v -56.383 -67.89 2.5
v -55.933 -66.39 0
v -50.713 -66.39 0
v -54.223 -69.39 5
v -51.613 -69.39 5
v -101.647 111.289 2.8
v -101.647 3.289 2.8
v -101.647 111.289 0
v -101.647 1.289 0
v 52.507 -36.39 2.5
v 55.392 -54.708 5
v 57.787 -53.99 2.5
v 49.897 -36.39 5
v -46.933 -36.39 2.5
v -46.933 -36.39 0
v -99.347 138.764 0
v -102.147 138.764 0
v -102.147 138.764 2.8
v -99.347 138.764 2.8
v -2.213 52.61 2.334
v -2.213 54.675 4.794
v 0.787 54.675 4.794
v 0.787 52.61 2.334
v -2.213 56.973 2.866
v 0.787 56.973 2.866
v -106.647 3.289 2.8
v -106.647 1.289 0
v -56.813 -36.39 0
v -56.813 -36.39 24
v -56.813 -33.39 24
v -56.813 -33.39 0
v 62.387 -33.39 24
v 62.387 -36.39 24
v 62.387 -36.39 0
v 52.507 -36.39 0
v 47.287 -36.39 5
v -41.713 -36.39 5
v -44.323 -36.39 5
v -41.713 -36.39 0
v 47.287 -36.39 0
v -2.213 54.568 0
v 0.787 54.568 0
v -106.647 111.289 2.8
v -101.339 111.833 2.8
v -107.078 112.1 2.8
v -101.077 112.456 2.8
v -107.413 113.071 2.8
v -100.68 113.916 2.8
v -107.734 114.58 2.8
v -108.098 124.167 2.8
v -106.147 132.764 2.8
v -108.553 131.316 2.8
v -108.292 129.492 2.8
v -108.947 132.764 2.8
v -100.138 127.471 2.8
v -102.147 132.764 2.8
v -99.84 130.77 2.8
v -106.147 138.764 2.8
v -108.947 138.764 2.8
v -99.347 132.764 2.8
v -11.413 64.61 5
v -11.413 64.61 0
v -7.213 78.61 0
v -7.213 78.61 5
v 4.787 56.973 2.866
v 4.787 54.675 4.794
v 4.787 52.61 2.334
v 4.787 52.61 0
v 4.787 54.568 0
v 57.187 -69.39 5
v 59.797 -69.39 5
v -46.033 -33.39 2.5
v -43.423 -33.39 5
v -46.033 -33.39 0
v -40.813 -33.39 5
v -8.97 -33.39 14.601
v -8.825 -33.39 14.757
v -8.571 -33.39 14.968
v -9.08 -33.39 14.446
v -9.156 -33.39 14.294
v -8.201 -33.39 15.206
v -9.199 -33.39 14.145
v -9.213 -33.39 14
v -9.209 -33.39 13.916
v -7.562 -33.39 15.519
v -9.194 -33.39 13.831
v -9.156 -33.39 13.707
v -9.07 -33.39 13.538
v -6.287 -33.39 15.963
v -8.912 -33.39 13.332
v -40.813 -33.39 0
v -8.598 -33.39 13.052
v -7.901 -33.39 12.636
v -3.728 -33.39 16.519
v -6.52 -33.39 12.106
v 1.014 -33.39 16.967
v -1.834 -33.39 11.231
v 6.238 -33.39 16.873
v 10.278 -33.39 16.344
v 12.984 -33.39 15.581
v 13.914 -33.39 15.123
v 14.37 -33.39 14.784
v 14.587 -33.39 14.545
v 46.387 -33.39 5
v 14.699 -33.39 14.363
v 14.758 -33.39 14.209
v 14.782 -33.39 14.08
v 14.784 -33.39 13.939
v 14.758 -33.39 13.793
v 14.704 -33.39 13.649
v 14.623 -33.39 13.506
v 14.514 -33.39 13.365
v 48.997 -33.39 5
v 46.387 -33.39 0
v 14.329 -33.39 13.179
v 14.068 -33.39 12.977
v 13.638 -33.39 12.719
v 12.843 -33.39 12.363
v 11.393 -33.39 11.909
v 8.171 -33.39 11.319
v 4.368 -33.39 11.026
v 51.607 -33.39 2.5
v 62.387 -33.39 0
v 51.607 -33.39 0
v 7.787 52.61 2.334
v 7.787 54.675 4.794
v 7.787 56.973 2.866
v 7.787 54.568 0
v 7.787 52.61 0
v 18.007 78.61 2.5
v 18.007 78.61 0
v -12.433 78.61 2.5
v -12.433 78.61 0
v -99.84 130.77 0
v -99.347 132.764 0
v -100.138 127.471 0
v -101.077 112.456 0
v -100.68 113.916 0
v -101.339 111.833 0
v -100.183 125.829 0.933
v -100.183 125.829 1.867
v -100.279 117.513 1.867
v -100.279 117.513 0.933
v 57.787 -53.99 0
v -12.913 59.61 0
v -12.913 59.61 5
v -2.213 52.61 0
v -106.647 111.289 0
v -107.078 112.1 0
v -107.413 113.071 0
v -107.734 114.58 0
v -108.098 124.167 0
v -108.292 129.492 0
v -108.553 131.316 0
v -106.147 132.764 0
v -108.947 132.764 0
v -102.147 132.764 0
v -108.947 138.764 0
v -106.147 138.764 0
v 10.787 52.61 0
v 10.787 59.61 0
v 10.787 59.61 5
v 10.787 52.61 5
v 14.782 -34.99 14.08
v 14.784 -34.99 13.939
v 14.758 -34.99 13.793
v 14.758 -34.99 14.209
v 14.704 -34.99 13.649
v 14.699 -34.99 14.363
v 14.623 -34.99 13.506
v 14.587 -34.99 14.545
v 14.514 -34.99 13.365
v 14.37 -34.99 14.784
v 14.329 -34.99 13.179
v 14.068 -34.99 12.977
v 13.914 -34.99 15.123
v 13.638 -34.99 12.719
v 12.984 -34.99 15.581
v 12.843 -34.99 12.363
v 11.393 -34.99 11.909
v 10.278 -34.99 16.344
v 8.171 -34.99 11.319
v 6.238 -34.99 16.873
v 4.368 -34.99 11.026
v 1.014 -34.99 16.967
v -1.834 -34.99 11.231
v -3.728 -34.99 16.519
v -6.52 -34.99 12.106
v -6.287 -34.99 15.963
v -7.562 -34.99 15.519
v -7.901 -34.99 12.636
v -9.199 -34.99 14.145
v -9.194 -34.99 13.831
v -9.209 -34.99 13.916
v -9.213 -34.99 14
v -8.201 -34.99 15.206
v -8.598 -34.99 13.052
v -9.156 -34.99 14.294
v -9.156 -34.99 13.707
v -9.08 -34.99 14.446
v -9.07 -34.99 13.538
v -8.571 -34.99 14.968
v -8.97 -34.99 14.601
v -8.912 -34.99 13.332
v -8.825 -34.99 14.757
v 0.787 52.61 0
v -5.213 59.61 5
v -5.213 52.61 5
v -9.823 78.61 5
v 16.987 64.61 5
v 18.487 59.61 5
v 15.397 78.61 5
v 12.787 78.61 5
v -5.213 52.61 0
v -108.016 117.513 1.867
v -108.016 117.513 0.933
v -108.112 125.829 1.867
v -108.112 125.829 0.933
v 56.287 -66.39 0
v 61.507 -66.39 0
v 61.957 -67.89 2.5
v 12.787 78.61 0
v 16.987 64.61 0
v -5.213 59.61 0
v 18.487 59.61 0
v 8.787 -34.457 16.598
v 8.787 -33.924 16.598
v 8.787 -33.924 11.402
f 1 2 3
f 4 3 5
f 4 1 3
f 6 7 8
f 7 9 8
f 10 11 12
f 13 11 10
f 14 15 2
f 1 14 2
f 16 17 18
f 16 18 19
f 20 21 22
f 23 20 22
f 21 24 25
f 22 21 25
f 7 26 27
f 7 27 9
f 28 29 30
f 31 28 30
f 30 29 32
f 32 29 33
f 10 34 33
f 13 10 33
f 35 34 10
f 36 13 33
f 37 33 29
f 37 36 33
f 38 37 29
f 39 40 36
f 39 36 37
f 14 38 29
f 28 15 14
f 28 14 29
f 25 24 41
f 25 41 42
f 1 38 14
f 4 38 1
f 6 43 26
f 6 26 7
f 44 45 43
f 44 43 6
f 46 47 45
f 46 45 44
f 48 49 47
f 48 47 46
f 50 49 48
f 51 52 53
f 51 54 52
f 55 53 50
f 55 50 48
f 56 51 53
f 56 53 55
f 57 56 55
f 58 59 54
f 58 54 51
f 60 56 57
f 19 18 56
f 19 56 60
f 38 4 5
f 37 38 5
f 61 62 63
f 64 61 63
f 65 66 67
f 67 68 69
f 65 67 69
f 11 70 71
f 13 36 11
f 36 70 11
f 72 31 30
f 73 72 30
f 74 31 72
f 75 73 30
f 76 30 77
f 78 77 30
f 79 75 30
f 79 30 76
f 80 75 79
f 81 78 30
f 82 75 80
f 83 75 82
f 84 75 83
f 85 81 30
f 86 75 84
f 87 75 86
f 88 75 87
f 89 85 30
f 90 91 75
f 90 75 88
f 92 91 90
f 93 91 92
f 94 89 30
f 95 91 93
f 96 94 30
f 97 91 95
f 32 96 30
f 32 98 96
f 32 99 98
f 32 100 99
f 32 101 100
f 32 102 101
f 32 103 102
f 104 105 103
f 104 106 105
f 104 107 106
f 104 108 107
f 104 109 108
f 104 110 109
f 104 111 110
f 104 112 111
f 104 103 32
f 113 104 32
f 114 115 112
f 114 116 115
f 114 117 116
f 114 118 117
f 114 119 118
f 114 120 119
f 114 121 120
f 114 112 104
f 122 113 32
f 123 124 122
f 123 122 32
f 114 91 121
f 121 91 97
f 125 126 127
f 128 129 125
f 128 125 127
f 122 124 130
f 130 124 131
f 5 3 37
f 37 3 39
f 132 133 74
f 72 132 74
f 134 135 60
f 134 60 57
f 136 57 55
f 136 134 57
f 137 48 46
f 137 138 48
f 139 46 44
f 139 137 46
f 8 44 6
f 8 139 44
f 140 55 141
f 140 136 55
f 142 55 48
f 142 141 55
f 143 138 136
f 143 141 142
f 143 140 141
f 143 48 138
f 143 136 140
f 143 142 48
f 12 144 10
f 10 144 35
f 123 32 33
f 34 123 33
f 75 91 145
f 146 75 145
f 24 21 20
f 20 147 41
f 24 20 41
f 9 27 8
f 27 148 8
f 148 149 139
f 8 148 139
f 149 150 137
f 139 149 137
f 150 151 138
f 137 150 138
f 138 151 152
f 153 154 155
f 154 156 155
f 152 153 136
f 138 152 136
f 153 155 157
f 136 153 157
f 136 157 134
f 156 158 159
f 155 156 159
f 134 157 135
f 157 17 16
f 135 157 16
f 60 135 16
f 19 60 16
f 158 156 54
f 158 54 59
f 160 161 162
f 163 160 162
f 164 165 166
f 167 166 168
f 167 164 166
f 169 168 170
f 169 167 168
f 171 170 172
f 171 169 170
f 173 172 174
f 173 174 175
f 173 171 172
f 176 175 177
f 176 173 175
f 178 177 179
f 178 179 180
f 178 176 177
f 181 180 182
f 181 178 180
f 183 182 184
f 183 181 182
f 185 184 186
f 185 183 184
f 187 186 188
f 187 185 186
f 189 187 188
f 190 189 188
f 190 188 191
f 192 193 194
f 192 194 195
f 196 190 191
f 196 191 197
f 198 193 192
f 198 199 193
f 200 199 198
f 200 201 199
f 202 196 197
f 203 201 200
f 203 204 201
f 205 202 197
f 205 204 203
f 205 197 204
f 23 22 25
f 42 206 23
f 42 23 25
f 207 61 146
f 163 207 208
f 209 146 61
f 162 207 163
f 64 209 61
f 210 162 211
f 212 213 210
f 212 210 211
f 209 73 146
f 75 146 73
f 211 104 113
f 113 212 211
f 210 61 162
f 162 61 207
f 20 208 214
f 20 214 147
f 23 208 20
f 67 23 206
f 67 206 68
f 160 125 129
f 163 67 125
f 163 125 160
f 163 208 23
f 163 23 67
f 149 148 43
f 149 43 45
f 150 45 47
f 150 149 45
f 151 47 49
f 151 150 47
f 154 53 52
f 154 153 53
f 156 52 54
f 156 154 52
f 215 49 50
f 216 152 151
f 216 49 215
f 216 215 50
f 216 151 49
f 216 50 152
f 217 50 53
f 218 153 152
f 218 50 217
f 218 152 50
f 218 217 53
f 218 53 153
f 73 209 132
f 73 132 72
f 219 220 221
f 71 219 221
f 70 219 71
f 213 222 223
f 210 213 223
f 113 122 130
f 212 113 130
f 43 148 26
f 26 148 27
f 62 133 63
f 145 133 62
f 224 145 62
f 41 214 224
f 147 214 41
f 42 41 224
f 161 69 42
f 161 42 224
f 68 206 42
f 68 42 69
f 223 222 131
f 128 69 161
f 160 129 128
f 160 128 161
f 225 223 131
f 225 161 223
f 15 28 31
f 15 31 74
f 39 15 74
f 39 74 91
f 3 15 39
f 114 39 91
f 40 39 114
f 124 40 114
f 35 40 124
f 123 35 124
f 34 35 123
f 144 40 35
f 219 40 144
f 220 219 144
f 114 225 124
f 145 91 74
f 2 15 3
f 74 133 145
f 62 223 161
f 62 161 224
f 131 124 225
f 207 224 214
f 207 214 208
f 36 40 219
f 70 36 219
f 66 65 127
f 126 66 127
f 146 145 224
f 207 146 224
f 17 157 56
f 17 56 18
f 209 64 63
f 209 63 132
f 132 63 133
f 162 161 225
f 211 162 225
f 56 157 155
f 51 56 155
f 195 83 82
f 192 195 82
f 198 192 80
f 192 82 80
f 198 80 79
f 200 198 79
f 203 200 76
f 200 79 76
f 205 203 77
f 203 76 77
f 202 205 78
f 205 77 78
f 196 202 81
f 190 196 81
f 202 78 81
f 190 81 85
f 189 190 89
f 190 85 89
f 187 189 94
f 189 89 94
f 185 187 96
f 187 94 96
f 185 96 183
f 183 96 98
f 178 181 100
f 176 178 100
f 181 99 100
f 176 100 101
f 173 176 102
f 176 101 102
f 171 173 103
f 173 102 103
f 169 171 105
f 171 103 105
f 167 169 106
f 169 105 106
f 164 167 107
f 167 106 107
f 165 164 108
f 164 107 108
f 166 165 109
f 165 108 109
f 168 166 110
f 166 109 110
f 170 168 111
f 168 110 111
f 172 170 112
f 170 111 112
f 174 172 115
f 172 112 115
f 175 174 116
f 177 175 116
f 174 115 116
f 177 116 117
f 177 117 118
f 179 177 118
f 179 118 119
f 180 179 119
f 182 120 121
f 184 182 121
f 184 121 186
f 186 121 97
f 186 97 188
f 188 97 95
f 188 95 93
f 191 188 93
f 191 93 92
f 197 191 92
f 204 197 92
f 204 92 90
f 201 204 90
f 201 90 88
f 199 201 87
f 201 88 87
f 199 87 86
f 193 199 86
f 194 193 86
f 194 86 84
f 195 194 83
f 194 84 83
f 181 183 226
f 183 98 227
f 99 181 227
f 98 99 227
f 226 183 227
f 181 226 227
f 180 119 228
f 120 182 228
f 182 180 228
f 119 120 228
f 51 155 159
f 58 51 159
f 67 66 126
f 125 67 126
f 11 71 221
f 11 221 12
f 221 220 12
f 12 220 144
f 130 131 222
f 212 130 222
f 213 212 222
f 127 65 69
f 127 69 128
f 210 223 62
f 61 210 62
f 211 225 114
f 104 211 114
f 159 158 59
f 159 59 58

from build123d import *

# Parameters (mm, degrees)
F1_DEPTH     = 5
F3_DEPTH     = 24
F4_W         = 16
F4_H         = 5
F5_DEPTH     = 7
F7_W         = 3
F7_H         = 3
F8_DEPTH     = 5
F9_W         = 2.8
F9_H         = 6
F10_DEPTH    = 2.8
F11_SIZE2    = 1.99999
F11_SIZE     = 2.79999
F13_W        = 140.8556848764
F13_H        = 22.6161023602
F14_DEPTH    = 2
F15_T1_DEPTH = 31.0827660092
F15_T3_DEPTH = 31.0827642559
F17_DEPTH    = 1.6
F18_SIZE     = 2.5


# Not quite as in the source:
# - a fillet or chamfer that OpenCascade refuses, or shapes differently, is made with other operations: its cross-section is extruded or revolved along the edge and cut away or added
# - a fillet or chamfer is up to 0.001 mm smaller than in the source, because OpenCascade refuses the exact size


with BuildPart() as f1:
    # F0 (on Top) → F1 (new body)
    with BuildSketch(Plane.XY):
        Polygon((-11.4133255483, 64.60974645), (-7.2133255483, 78.60974645), (-12.4334788322, 78.60974645), (-52.2133255483, -53.9897426034), (-52.2133255483, -71.39025355), (-41.7133255483, -36.39025355), (-40.8133255483, -33.39025355), (-12.9133255483, 59.60974645), align=None)
        Polygon((16.9866744517, 64.60974645), (-11.4133255483, 64.60974645), (-12.9133255483, 59.60974645), (18.4866744517, 59.60974645), align=None)
        Polygon((18.006829489, 78.60974645), (12.7866744517, 78.60974645), (16.9866744517, 64.60974645), (18.4866744517, 59.60974645), (46.3866744517, -33.39025355), (47.2866744517, -36.39025355), (57.7866744517, -71.39025355), (57.7866744517, -53.989736759), align=None)
        Polygon((46.3866744517, -33.39025355), (-40.8133255483, -33.39025355), (-41.7133255483, -36.39025355), (47.2866744517, -36.39025355), align=None)
        Polygon((-52.2133255483, -71.39025355), (-52.2133255483, -53.9897426034), (-57.0024570015, -69.953514114), align=None)
        Polygon((62.5758075135, -69.9535136315), (57.7866744517, -53.989736759), (57.7866744517, -71.39025355), align=None)
    extrude(amount=F1_DEPTH)

    # F2 (on face) → F3 (join)
    with BuildSketch(Plane(origin=(0, 0, 0), x_dir=(1, 0, 0), z_dir=(0, 0, -1))):
        Polygon((-56.8133255483, 33.39025355), (-40.8133255483, 33.39025355), (46.3866744517, 33.39025355), (62.3866744517, 33.39025355), (62.3866744517, 36.39025355), (47.2866744517, 36.39025355), (-41.7133255483, 36.39025355), (-56.8133255483, 36.39025355), align=None)
    extrude(amount=-F3_DEPTH)

    # F4 (on face) → F5 (join)
    with BuildSketch(Plane.XZ.offset(-59.60974645)):
        with Locations((2.7866744517, 2.5)):
            Rectangle(F4_W, F4_H)
    extrude(amount=F5_DEPTH)

    # F7 (on face) → F8 (cut)
    with BuildSketch(Plane(origin=(0, 21.7370799257, 25.905243094), x_dir=(1, 0, 0), z_dir=(0, 0.6427876097, 0.7660444431))):
        with Locations((6.2866744517, 40.3014039219)):
            Rectangle(F7_W, F7_H)
        with Locations((-0.7133255483, 40.3014039219)):
            Rectangle(F7_W, F7_H)
    extrude(amount=F8_DEPTH, mode=Mode.SUBTRACT)

    # F13 (on 3pt) → F14 (cut)
    with BuildSketch(Plane.XZ.offset(71.39025355)):
        with Locations((4.5045018196, 1.0812641121)):
            Rectangle(F13_W, F13_H)
    extrude(amount=-F14_DEPTH, mode=Mode.SUBTRACT)

    # F15: chamfer of 5 x 3 on 2 edges, made by hand

    # F15_s2 → F15_t1 (cut)
    with BuildSketch(Plane.YZ.offset(44.2553689658)):
        Polygon((-66.39025355, 0), (-69.39025355, 5), (-69.39025355, 0), align=None)
    extrude(amount=F15_T1_DEPTH, mode=Mode.SUBTRACT)

    # F15_s4 → F15_t3 (cut)
    with BuildSketch(Plane.YZ.offset(-69.7647843182)):
        Polygon((-66.39025355, 0), (-69.39025355, 5), (-69.39025355, 0), align=None)
    extrude(amount=F15_T3_DEPTH, mode=Mode.SUBTRACT)

    # F16 (on face) → F17 (cut)
    with BuildSketch(Plane(origin=(0, -33.39025355, 0), x_dir=(-1, 0, 0), z_dir=(0, 1, 0))):
        with BuildLine():
            add(Edge.make_bspline(
                [(9.2133255483, 14), (9.2133255483, 19.1961524227), (-8.7866744517, 16.5980762114), (-26.7866744517, 14), (-8.7866744517, 11.4019237886), (9.2133255483, 8.8038475773), (9.2133255483, 14)],
                knots=[0, 0, 0, 2.0943951024, 2.0943951024, 4.1887902048, 4.1887902048, 6.2831853072, 6.2831853072, 6.2831853072], degree=2, weights=[1, 0.5, 1, 0.5, 1, 0.5, 1]))
        make_face()
    extrude(amount=-F17_DEPTH, mode=Mode.SUBTRACT)

    # F18
    f18_edges = [f1.edges().sort_by_distance(p)[0] for p in [
        (-29.233479, 22.609746, 5),
        (34.806829, 22.609746, 5),
        (-51.883479, -52.890254, 5),
        (57.456829, -52.890254, 5),
    ]]
    chamfer(f18_edges, length=F18_SIZE)


with BuildPart() as f10:
    # F9 (on Top) → F10 (new body)
    with BuildSketch(Plane.XY):
        with BuildLine():
            Line((-106.6472975697, 1.2893290818), (-101.6472975697, 1.2893290818))
            Line((-101.6472975697, 1.2893290818), (-101.6472975697, 111.2893290818))
            add(Edge.make_bspline(
                [(-101.6472975697, 111.2893290818), (-102.9340378828, 109.355815566), (-105.3605572566, 109.355815566), (-106.6472975697, 111.2893290818)],
                knots=[0.403038575, 0.403038575, 0.403038575, 0.403038575, 0.596961425, 0.596961425, 0.596961425, 0.596961425], degree=3))
            Line((-106.6472975697, 111.2893290818), (-106.6472975697, 1.2893290818))
        make_face()
        with BuildLine():
            Line((-106.6472975697, 111.2893290818), (-101.6472975697, 111.2893290818))
            add(Edge.make_bspline(
                [(-99.3472975697, 132.7641010284), (-101.2220129553, 127.6781910253), (-98.973007346, 115.3078371211), (-101.6472975697, 111.2893290818)],
                knots=[0, 0, 0, 0, 0.403038575, 0.403038575, 0.403038575, 0.403038575], degree=3))
            Line((-99.3472975697, 132.7641010284), (-102.1472975697, 132.7641010284))
            Line((-102.1472975697, 132.7641010284), (-106.1472975697, 132.7641010284))
            Line((-106.1472975697, 132.7641010284), (-108.9472975697, 132.7641010284))
            add(Edge.make_bspline(
                [(-106.6472975697, 111.2893290818), (-109.3215877933, 115.3078371211), (-107.072582184, 127.6781910253), (-108.9472975697, 132.7641010284)],
                knots=[0.596961425, 0.596961425, 0.596961425, 0.596961425, 1, 1, 1, 1], degree=3))
        make_face()
        with Locations((-100.7472975697, 135.7641010284)):
            Rectangle(F9_W, F9_H)
        with Locations((-107.5472975697, 135.7641010284)):
            Rectangle(F9_W, F9_H)
        with BuildLine():
            add(Edge.make_bspline(
                [(-101.6472975697, 111.2893290818), (-102.9340378828, 109.355815566), (-105.3605572566, 109.355815566), (-106.6472975697, 111.2893290818)],
                knots=[0.403038575, 0.403038575, 0.403038575, 0.403038575, 0.596961425, 0.596961425, 0.596961425, 0.596961425], degree=3))
            Line((-101.6472975697, 111.2893290818), (-106.6472975697, 111.2893290818))
        make_face()
    extrude(amount=F10_DEPTH)

    # F11 (size 2.8 and 2 in the source; OpenCascade refuses exactly that, so slightly less here)
    f11_edges = [f10.edges().sort_by_distance(p)[0] for p in [
        (-104.147298, 1.289329, 2.8),
    ]]
    f11_side = f10.faces().sort_by_distance((-104.147298, 1.289329, 1.4))[0]
    chamfer(f11_edges, length=F11_SIZE, length2=F11_SIZE2, reference=f11_side)


solid = Compound([f1.part, f10.part])
